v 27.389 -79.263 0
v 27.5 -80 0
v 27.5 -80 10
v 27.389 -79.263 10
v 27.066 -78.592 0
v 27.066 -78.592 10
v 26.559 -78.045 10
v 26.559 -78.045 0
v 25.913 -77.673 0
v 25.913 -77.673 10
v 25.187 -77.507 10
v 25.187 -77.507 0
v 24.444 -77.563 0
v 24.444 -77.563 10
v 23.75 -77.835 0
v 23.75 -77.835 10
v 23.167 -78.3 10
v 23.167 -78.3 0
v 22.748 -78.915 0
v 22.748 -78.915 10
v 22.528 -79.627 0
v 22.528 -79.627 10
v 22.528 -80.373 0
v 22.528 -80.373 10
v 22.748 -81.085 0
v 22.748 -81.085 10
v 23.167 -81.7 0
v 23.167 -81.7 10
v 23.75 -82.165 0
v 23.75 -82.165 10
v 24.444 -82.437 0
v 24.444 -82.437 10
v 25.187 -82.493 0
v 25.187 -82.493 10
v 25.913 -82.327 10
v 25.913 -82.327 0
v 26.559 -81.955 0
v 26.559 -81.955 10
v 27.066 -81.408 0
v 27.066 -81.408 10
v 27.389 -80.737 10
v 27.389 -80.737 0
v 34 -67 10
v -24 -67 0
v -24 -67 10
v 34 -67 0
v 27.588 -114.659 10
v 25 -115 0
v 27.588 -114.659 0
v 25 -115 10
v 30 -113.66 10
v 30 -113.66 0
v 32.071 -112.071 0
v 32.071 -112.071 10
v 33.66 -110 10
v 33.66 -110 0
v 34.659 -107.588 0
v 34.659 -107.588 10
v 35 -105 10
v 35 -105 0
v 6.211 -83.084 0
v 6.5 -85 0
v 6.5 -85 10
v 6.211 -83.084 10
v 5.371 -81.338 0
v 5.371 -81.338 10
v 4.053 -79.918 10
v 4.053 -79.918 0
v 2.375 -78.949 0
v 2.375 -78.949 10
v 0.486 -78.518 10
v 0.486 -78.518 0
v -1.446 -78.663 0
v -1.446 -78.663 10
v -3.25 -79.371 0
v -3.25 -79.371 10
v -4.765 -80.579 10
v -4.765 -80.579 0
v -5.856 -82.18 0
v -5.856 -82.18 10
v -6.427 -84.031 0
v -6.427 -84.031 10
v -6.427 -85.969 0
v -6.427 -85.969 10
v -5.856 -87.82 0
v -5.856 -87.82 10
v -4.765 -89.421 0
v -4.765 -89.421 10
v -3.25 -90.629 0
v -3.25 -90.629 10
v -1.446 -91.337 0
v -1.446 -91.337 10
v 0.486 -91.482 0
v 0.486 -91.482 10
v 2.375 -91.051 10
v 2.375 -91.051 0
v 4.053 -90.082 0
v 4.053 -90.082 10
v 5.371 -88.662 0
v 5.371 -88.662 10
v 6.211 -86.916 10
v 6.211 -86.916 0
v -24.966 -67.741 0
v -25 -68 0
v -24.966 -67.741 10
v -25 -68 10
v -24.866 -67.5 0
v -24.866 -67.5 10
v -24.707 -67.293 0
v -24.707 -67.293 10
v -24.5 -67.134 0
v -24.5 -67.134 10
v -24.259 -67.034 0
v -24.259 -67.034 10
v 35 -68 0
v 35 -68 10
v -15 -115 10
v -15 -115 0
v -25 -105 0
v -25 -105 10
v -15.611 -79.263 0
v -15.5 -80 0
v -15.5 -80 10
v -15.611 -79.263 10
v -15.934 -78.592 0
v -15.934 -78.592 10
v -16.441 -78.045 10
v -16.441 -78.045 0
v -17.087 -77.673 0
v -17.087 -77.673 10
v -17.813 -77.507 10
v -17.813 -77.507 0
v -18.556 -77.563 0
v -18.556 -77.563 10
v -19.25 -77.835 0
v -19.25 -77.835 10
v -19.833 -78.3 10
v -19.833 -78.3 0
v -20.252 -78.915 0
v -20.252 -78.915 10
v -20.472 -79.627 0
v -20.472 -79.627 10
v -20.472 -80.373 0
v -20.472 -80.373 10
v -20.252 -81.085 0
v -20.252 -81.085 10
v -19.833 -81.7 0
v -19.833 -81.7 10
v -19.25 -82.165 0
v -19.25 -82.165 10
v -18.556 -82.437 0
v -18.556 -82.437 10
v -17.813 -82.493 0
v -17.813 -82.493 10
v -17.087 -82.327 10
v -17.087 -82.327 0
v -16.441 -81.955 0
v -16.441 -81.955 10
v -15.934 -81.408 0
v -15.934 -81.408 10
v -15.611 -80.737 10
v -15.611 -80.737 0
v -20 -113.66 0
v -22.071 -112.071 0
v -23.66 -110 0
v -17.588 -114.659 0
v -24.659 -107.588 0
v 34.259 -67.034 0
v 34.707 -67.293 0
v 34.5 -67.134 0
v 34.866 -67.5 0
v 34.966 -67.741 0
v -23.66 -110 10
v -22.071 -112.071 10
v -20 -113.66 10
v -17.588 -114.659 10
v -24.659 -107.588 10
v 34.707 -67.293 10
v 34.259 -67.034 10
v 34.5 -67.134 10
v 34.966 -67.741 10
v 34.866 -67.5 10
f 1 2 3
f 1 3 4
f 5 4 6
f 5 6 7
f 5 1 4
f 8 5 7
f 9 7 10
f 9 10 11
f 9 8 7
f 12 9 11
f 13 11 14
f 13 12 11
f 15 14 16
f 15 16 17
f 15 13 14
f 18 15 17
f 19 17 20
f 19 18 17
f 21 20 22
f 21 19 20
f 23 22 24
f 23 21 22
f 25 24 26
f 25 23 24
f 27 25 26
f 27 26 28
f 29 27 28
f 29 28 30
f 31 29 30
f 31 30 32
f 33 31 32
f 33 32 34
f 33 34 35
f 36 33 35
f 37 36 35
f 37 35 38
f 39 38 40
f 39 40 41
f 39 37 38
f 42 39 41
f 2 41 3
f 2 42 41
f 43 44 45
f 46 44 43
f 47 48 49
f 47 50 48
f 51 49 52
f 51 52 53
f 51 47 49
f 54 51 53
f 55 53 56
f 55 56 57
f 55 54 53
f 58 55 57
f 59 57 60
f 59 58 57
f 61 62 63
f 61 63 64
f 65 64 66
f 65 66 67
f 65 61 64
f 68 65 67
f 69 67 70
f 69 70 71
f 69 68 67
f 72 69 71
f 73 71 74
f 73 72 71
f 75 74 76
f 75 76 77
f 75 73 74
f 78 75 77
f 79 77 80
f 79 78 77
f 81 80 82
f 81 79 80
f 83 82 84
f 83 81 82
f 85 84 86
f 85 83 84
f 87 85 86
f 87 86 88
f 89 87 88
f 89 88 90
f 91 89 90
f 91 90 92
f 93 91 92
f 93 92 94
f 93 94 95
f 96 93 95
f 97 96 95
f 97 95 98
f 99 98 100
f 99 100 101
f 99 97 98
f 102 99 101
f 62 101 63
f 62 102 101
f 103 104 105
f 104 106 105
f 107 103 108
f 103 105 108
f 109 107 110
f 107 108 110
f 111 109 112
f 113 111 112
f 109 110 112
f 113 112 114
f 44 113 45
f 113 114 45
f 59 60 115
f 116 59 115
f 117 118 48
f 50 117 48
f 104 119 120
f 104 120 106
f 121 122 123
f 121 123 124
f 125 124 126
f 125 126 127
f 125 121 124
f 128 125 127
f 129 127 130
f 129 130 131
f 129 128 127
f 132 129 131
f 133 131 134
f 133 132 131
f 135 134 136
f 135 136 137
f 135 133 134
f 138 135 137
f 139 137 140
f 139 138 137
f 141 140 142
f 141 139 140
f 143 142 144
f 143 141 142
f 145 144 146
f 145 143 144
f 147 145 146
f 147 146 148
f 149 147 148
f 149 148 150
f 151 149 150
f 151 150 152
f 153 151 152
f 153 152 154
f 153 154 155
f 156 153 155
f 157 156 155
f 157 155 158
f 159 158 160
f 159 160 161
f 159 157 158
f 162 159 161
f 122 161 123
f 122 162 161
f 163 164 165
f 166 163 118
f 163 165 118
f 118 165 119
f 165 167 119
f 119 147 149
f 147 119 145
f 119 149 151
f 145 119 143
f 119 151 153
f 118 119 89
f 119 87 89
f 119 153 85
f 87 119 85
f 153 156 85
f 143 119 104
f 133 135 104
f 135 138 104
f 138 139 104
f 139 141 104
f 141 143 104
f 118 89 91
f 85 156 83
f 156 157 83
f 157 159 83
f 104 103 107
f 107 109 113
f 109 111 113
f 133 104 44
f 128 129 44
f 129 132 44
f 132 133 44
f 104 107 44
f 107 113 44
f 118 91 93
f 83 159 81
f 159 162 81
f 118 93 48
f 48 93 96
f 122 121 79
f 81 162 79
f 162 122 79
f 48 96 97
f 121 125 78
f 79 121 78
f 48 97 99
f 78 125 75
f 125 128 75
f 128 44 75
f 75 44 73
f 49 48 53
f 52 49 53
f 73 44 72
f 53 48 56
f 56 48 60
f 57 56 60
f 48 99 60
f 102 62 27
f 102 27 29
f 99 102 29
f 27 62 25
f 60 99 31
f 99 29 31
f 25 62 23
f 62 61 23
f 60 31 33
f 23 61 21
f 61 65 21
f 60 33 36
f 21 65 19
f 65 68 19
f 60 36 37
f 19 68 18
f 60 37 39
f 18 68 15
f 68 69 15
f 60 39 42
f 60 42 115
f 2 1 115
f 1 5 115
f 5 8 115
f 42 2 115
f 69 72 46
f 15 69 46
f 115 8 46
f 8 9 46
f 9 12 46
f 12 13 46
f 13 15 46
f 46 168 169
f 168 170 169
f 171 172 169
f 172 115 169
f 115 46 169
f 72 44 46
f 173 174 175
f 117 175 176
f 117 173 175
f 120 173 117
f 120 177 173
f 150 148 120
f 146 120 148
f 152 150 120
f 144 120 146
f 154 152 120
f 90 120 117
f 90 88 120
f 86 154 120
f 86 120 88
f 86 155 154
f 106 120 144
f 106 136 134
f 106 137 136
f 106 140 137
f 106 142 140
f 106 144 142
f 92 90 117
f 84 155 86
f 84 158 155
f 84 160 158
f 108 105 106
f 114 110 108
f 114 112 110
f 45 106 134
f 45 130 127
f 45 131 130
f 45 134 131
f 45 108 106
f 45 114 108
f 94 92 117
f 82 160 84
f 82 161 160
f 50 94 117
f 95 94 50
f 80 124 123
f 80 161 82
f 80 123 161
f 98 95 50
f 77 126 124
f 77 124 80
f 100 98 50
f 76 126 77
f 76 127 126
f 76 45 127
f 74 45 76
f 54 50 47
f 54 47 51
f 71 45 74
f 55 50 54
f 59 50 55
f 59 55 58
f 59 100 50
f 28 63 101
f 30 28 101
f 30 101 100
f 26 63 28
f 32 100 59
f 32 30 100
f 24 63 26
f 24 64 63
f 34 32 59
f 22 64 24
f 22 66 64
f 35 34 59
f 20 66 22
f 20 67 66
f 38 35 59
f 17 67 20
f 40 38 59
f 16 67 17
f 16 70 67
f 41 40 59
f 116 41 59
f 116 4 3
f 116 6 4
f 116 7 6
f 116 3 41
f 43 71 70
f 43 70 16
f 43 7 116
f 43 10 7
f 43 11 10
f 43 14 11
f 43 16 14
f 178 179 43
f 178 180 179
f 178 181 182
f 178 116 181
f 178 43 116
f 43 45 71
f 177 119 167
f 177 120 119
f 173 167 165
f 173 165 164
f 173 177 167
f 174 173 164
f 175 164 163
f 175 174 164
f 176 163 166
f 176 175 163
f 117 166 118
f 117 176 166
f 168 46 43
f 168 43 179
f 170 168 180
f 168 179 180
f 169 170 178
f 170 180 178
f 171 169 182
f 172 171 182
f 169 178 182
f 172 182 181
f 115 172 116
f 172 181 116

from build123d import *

# Parameters (mm, degrees)
SKETCH_W    = 60
SKETCH_H    = 48
SKETCH_R    = 2.5
SKETCH_R_2  = 6.5
PAD_DEPTH   = 10
FILLET_R    = 10
FILLET001_R = 1


with BuildPart() as part:
    # Sketch → Pad (new body)
    with BuildSketch(Plane.XY):
        with Locations((5, -91)):
            Rectangle(SKETCH_W, SKETCH_H)
        with Locations((25, -80)):
            Circle(SKETCH_R, mode=Mode.SUBTRACT)
        with Locations((-18, -80)):
            Circle(SKETCH_R, mode=Mode.SUBTRACT)
        with Locations((0, -85)):
            Circle(SKETCH_R_2, mode=Mode.SUBTRACT)
    extrude(amount=PAD_DEPTH)

    # Fillet
    fillet_edges = [part.edges().sort_by_distance(p)[0] for p in [
        (-25, -115, 5),
        (35, -115, 5),
    ]]
    fillet(fillet_edges, radius=FILLET_R)

    # Fillet001
    fillet001_edges = [part.edges().sort_by_distance(p)[0] for p in [
        (35, -67, 5),
        (-25, -67, 5),
    ]]
    fillet(fillet001_edges, radius=FILLET001_R)


solid = part.part
